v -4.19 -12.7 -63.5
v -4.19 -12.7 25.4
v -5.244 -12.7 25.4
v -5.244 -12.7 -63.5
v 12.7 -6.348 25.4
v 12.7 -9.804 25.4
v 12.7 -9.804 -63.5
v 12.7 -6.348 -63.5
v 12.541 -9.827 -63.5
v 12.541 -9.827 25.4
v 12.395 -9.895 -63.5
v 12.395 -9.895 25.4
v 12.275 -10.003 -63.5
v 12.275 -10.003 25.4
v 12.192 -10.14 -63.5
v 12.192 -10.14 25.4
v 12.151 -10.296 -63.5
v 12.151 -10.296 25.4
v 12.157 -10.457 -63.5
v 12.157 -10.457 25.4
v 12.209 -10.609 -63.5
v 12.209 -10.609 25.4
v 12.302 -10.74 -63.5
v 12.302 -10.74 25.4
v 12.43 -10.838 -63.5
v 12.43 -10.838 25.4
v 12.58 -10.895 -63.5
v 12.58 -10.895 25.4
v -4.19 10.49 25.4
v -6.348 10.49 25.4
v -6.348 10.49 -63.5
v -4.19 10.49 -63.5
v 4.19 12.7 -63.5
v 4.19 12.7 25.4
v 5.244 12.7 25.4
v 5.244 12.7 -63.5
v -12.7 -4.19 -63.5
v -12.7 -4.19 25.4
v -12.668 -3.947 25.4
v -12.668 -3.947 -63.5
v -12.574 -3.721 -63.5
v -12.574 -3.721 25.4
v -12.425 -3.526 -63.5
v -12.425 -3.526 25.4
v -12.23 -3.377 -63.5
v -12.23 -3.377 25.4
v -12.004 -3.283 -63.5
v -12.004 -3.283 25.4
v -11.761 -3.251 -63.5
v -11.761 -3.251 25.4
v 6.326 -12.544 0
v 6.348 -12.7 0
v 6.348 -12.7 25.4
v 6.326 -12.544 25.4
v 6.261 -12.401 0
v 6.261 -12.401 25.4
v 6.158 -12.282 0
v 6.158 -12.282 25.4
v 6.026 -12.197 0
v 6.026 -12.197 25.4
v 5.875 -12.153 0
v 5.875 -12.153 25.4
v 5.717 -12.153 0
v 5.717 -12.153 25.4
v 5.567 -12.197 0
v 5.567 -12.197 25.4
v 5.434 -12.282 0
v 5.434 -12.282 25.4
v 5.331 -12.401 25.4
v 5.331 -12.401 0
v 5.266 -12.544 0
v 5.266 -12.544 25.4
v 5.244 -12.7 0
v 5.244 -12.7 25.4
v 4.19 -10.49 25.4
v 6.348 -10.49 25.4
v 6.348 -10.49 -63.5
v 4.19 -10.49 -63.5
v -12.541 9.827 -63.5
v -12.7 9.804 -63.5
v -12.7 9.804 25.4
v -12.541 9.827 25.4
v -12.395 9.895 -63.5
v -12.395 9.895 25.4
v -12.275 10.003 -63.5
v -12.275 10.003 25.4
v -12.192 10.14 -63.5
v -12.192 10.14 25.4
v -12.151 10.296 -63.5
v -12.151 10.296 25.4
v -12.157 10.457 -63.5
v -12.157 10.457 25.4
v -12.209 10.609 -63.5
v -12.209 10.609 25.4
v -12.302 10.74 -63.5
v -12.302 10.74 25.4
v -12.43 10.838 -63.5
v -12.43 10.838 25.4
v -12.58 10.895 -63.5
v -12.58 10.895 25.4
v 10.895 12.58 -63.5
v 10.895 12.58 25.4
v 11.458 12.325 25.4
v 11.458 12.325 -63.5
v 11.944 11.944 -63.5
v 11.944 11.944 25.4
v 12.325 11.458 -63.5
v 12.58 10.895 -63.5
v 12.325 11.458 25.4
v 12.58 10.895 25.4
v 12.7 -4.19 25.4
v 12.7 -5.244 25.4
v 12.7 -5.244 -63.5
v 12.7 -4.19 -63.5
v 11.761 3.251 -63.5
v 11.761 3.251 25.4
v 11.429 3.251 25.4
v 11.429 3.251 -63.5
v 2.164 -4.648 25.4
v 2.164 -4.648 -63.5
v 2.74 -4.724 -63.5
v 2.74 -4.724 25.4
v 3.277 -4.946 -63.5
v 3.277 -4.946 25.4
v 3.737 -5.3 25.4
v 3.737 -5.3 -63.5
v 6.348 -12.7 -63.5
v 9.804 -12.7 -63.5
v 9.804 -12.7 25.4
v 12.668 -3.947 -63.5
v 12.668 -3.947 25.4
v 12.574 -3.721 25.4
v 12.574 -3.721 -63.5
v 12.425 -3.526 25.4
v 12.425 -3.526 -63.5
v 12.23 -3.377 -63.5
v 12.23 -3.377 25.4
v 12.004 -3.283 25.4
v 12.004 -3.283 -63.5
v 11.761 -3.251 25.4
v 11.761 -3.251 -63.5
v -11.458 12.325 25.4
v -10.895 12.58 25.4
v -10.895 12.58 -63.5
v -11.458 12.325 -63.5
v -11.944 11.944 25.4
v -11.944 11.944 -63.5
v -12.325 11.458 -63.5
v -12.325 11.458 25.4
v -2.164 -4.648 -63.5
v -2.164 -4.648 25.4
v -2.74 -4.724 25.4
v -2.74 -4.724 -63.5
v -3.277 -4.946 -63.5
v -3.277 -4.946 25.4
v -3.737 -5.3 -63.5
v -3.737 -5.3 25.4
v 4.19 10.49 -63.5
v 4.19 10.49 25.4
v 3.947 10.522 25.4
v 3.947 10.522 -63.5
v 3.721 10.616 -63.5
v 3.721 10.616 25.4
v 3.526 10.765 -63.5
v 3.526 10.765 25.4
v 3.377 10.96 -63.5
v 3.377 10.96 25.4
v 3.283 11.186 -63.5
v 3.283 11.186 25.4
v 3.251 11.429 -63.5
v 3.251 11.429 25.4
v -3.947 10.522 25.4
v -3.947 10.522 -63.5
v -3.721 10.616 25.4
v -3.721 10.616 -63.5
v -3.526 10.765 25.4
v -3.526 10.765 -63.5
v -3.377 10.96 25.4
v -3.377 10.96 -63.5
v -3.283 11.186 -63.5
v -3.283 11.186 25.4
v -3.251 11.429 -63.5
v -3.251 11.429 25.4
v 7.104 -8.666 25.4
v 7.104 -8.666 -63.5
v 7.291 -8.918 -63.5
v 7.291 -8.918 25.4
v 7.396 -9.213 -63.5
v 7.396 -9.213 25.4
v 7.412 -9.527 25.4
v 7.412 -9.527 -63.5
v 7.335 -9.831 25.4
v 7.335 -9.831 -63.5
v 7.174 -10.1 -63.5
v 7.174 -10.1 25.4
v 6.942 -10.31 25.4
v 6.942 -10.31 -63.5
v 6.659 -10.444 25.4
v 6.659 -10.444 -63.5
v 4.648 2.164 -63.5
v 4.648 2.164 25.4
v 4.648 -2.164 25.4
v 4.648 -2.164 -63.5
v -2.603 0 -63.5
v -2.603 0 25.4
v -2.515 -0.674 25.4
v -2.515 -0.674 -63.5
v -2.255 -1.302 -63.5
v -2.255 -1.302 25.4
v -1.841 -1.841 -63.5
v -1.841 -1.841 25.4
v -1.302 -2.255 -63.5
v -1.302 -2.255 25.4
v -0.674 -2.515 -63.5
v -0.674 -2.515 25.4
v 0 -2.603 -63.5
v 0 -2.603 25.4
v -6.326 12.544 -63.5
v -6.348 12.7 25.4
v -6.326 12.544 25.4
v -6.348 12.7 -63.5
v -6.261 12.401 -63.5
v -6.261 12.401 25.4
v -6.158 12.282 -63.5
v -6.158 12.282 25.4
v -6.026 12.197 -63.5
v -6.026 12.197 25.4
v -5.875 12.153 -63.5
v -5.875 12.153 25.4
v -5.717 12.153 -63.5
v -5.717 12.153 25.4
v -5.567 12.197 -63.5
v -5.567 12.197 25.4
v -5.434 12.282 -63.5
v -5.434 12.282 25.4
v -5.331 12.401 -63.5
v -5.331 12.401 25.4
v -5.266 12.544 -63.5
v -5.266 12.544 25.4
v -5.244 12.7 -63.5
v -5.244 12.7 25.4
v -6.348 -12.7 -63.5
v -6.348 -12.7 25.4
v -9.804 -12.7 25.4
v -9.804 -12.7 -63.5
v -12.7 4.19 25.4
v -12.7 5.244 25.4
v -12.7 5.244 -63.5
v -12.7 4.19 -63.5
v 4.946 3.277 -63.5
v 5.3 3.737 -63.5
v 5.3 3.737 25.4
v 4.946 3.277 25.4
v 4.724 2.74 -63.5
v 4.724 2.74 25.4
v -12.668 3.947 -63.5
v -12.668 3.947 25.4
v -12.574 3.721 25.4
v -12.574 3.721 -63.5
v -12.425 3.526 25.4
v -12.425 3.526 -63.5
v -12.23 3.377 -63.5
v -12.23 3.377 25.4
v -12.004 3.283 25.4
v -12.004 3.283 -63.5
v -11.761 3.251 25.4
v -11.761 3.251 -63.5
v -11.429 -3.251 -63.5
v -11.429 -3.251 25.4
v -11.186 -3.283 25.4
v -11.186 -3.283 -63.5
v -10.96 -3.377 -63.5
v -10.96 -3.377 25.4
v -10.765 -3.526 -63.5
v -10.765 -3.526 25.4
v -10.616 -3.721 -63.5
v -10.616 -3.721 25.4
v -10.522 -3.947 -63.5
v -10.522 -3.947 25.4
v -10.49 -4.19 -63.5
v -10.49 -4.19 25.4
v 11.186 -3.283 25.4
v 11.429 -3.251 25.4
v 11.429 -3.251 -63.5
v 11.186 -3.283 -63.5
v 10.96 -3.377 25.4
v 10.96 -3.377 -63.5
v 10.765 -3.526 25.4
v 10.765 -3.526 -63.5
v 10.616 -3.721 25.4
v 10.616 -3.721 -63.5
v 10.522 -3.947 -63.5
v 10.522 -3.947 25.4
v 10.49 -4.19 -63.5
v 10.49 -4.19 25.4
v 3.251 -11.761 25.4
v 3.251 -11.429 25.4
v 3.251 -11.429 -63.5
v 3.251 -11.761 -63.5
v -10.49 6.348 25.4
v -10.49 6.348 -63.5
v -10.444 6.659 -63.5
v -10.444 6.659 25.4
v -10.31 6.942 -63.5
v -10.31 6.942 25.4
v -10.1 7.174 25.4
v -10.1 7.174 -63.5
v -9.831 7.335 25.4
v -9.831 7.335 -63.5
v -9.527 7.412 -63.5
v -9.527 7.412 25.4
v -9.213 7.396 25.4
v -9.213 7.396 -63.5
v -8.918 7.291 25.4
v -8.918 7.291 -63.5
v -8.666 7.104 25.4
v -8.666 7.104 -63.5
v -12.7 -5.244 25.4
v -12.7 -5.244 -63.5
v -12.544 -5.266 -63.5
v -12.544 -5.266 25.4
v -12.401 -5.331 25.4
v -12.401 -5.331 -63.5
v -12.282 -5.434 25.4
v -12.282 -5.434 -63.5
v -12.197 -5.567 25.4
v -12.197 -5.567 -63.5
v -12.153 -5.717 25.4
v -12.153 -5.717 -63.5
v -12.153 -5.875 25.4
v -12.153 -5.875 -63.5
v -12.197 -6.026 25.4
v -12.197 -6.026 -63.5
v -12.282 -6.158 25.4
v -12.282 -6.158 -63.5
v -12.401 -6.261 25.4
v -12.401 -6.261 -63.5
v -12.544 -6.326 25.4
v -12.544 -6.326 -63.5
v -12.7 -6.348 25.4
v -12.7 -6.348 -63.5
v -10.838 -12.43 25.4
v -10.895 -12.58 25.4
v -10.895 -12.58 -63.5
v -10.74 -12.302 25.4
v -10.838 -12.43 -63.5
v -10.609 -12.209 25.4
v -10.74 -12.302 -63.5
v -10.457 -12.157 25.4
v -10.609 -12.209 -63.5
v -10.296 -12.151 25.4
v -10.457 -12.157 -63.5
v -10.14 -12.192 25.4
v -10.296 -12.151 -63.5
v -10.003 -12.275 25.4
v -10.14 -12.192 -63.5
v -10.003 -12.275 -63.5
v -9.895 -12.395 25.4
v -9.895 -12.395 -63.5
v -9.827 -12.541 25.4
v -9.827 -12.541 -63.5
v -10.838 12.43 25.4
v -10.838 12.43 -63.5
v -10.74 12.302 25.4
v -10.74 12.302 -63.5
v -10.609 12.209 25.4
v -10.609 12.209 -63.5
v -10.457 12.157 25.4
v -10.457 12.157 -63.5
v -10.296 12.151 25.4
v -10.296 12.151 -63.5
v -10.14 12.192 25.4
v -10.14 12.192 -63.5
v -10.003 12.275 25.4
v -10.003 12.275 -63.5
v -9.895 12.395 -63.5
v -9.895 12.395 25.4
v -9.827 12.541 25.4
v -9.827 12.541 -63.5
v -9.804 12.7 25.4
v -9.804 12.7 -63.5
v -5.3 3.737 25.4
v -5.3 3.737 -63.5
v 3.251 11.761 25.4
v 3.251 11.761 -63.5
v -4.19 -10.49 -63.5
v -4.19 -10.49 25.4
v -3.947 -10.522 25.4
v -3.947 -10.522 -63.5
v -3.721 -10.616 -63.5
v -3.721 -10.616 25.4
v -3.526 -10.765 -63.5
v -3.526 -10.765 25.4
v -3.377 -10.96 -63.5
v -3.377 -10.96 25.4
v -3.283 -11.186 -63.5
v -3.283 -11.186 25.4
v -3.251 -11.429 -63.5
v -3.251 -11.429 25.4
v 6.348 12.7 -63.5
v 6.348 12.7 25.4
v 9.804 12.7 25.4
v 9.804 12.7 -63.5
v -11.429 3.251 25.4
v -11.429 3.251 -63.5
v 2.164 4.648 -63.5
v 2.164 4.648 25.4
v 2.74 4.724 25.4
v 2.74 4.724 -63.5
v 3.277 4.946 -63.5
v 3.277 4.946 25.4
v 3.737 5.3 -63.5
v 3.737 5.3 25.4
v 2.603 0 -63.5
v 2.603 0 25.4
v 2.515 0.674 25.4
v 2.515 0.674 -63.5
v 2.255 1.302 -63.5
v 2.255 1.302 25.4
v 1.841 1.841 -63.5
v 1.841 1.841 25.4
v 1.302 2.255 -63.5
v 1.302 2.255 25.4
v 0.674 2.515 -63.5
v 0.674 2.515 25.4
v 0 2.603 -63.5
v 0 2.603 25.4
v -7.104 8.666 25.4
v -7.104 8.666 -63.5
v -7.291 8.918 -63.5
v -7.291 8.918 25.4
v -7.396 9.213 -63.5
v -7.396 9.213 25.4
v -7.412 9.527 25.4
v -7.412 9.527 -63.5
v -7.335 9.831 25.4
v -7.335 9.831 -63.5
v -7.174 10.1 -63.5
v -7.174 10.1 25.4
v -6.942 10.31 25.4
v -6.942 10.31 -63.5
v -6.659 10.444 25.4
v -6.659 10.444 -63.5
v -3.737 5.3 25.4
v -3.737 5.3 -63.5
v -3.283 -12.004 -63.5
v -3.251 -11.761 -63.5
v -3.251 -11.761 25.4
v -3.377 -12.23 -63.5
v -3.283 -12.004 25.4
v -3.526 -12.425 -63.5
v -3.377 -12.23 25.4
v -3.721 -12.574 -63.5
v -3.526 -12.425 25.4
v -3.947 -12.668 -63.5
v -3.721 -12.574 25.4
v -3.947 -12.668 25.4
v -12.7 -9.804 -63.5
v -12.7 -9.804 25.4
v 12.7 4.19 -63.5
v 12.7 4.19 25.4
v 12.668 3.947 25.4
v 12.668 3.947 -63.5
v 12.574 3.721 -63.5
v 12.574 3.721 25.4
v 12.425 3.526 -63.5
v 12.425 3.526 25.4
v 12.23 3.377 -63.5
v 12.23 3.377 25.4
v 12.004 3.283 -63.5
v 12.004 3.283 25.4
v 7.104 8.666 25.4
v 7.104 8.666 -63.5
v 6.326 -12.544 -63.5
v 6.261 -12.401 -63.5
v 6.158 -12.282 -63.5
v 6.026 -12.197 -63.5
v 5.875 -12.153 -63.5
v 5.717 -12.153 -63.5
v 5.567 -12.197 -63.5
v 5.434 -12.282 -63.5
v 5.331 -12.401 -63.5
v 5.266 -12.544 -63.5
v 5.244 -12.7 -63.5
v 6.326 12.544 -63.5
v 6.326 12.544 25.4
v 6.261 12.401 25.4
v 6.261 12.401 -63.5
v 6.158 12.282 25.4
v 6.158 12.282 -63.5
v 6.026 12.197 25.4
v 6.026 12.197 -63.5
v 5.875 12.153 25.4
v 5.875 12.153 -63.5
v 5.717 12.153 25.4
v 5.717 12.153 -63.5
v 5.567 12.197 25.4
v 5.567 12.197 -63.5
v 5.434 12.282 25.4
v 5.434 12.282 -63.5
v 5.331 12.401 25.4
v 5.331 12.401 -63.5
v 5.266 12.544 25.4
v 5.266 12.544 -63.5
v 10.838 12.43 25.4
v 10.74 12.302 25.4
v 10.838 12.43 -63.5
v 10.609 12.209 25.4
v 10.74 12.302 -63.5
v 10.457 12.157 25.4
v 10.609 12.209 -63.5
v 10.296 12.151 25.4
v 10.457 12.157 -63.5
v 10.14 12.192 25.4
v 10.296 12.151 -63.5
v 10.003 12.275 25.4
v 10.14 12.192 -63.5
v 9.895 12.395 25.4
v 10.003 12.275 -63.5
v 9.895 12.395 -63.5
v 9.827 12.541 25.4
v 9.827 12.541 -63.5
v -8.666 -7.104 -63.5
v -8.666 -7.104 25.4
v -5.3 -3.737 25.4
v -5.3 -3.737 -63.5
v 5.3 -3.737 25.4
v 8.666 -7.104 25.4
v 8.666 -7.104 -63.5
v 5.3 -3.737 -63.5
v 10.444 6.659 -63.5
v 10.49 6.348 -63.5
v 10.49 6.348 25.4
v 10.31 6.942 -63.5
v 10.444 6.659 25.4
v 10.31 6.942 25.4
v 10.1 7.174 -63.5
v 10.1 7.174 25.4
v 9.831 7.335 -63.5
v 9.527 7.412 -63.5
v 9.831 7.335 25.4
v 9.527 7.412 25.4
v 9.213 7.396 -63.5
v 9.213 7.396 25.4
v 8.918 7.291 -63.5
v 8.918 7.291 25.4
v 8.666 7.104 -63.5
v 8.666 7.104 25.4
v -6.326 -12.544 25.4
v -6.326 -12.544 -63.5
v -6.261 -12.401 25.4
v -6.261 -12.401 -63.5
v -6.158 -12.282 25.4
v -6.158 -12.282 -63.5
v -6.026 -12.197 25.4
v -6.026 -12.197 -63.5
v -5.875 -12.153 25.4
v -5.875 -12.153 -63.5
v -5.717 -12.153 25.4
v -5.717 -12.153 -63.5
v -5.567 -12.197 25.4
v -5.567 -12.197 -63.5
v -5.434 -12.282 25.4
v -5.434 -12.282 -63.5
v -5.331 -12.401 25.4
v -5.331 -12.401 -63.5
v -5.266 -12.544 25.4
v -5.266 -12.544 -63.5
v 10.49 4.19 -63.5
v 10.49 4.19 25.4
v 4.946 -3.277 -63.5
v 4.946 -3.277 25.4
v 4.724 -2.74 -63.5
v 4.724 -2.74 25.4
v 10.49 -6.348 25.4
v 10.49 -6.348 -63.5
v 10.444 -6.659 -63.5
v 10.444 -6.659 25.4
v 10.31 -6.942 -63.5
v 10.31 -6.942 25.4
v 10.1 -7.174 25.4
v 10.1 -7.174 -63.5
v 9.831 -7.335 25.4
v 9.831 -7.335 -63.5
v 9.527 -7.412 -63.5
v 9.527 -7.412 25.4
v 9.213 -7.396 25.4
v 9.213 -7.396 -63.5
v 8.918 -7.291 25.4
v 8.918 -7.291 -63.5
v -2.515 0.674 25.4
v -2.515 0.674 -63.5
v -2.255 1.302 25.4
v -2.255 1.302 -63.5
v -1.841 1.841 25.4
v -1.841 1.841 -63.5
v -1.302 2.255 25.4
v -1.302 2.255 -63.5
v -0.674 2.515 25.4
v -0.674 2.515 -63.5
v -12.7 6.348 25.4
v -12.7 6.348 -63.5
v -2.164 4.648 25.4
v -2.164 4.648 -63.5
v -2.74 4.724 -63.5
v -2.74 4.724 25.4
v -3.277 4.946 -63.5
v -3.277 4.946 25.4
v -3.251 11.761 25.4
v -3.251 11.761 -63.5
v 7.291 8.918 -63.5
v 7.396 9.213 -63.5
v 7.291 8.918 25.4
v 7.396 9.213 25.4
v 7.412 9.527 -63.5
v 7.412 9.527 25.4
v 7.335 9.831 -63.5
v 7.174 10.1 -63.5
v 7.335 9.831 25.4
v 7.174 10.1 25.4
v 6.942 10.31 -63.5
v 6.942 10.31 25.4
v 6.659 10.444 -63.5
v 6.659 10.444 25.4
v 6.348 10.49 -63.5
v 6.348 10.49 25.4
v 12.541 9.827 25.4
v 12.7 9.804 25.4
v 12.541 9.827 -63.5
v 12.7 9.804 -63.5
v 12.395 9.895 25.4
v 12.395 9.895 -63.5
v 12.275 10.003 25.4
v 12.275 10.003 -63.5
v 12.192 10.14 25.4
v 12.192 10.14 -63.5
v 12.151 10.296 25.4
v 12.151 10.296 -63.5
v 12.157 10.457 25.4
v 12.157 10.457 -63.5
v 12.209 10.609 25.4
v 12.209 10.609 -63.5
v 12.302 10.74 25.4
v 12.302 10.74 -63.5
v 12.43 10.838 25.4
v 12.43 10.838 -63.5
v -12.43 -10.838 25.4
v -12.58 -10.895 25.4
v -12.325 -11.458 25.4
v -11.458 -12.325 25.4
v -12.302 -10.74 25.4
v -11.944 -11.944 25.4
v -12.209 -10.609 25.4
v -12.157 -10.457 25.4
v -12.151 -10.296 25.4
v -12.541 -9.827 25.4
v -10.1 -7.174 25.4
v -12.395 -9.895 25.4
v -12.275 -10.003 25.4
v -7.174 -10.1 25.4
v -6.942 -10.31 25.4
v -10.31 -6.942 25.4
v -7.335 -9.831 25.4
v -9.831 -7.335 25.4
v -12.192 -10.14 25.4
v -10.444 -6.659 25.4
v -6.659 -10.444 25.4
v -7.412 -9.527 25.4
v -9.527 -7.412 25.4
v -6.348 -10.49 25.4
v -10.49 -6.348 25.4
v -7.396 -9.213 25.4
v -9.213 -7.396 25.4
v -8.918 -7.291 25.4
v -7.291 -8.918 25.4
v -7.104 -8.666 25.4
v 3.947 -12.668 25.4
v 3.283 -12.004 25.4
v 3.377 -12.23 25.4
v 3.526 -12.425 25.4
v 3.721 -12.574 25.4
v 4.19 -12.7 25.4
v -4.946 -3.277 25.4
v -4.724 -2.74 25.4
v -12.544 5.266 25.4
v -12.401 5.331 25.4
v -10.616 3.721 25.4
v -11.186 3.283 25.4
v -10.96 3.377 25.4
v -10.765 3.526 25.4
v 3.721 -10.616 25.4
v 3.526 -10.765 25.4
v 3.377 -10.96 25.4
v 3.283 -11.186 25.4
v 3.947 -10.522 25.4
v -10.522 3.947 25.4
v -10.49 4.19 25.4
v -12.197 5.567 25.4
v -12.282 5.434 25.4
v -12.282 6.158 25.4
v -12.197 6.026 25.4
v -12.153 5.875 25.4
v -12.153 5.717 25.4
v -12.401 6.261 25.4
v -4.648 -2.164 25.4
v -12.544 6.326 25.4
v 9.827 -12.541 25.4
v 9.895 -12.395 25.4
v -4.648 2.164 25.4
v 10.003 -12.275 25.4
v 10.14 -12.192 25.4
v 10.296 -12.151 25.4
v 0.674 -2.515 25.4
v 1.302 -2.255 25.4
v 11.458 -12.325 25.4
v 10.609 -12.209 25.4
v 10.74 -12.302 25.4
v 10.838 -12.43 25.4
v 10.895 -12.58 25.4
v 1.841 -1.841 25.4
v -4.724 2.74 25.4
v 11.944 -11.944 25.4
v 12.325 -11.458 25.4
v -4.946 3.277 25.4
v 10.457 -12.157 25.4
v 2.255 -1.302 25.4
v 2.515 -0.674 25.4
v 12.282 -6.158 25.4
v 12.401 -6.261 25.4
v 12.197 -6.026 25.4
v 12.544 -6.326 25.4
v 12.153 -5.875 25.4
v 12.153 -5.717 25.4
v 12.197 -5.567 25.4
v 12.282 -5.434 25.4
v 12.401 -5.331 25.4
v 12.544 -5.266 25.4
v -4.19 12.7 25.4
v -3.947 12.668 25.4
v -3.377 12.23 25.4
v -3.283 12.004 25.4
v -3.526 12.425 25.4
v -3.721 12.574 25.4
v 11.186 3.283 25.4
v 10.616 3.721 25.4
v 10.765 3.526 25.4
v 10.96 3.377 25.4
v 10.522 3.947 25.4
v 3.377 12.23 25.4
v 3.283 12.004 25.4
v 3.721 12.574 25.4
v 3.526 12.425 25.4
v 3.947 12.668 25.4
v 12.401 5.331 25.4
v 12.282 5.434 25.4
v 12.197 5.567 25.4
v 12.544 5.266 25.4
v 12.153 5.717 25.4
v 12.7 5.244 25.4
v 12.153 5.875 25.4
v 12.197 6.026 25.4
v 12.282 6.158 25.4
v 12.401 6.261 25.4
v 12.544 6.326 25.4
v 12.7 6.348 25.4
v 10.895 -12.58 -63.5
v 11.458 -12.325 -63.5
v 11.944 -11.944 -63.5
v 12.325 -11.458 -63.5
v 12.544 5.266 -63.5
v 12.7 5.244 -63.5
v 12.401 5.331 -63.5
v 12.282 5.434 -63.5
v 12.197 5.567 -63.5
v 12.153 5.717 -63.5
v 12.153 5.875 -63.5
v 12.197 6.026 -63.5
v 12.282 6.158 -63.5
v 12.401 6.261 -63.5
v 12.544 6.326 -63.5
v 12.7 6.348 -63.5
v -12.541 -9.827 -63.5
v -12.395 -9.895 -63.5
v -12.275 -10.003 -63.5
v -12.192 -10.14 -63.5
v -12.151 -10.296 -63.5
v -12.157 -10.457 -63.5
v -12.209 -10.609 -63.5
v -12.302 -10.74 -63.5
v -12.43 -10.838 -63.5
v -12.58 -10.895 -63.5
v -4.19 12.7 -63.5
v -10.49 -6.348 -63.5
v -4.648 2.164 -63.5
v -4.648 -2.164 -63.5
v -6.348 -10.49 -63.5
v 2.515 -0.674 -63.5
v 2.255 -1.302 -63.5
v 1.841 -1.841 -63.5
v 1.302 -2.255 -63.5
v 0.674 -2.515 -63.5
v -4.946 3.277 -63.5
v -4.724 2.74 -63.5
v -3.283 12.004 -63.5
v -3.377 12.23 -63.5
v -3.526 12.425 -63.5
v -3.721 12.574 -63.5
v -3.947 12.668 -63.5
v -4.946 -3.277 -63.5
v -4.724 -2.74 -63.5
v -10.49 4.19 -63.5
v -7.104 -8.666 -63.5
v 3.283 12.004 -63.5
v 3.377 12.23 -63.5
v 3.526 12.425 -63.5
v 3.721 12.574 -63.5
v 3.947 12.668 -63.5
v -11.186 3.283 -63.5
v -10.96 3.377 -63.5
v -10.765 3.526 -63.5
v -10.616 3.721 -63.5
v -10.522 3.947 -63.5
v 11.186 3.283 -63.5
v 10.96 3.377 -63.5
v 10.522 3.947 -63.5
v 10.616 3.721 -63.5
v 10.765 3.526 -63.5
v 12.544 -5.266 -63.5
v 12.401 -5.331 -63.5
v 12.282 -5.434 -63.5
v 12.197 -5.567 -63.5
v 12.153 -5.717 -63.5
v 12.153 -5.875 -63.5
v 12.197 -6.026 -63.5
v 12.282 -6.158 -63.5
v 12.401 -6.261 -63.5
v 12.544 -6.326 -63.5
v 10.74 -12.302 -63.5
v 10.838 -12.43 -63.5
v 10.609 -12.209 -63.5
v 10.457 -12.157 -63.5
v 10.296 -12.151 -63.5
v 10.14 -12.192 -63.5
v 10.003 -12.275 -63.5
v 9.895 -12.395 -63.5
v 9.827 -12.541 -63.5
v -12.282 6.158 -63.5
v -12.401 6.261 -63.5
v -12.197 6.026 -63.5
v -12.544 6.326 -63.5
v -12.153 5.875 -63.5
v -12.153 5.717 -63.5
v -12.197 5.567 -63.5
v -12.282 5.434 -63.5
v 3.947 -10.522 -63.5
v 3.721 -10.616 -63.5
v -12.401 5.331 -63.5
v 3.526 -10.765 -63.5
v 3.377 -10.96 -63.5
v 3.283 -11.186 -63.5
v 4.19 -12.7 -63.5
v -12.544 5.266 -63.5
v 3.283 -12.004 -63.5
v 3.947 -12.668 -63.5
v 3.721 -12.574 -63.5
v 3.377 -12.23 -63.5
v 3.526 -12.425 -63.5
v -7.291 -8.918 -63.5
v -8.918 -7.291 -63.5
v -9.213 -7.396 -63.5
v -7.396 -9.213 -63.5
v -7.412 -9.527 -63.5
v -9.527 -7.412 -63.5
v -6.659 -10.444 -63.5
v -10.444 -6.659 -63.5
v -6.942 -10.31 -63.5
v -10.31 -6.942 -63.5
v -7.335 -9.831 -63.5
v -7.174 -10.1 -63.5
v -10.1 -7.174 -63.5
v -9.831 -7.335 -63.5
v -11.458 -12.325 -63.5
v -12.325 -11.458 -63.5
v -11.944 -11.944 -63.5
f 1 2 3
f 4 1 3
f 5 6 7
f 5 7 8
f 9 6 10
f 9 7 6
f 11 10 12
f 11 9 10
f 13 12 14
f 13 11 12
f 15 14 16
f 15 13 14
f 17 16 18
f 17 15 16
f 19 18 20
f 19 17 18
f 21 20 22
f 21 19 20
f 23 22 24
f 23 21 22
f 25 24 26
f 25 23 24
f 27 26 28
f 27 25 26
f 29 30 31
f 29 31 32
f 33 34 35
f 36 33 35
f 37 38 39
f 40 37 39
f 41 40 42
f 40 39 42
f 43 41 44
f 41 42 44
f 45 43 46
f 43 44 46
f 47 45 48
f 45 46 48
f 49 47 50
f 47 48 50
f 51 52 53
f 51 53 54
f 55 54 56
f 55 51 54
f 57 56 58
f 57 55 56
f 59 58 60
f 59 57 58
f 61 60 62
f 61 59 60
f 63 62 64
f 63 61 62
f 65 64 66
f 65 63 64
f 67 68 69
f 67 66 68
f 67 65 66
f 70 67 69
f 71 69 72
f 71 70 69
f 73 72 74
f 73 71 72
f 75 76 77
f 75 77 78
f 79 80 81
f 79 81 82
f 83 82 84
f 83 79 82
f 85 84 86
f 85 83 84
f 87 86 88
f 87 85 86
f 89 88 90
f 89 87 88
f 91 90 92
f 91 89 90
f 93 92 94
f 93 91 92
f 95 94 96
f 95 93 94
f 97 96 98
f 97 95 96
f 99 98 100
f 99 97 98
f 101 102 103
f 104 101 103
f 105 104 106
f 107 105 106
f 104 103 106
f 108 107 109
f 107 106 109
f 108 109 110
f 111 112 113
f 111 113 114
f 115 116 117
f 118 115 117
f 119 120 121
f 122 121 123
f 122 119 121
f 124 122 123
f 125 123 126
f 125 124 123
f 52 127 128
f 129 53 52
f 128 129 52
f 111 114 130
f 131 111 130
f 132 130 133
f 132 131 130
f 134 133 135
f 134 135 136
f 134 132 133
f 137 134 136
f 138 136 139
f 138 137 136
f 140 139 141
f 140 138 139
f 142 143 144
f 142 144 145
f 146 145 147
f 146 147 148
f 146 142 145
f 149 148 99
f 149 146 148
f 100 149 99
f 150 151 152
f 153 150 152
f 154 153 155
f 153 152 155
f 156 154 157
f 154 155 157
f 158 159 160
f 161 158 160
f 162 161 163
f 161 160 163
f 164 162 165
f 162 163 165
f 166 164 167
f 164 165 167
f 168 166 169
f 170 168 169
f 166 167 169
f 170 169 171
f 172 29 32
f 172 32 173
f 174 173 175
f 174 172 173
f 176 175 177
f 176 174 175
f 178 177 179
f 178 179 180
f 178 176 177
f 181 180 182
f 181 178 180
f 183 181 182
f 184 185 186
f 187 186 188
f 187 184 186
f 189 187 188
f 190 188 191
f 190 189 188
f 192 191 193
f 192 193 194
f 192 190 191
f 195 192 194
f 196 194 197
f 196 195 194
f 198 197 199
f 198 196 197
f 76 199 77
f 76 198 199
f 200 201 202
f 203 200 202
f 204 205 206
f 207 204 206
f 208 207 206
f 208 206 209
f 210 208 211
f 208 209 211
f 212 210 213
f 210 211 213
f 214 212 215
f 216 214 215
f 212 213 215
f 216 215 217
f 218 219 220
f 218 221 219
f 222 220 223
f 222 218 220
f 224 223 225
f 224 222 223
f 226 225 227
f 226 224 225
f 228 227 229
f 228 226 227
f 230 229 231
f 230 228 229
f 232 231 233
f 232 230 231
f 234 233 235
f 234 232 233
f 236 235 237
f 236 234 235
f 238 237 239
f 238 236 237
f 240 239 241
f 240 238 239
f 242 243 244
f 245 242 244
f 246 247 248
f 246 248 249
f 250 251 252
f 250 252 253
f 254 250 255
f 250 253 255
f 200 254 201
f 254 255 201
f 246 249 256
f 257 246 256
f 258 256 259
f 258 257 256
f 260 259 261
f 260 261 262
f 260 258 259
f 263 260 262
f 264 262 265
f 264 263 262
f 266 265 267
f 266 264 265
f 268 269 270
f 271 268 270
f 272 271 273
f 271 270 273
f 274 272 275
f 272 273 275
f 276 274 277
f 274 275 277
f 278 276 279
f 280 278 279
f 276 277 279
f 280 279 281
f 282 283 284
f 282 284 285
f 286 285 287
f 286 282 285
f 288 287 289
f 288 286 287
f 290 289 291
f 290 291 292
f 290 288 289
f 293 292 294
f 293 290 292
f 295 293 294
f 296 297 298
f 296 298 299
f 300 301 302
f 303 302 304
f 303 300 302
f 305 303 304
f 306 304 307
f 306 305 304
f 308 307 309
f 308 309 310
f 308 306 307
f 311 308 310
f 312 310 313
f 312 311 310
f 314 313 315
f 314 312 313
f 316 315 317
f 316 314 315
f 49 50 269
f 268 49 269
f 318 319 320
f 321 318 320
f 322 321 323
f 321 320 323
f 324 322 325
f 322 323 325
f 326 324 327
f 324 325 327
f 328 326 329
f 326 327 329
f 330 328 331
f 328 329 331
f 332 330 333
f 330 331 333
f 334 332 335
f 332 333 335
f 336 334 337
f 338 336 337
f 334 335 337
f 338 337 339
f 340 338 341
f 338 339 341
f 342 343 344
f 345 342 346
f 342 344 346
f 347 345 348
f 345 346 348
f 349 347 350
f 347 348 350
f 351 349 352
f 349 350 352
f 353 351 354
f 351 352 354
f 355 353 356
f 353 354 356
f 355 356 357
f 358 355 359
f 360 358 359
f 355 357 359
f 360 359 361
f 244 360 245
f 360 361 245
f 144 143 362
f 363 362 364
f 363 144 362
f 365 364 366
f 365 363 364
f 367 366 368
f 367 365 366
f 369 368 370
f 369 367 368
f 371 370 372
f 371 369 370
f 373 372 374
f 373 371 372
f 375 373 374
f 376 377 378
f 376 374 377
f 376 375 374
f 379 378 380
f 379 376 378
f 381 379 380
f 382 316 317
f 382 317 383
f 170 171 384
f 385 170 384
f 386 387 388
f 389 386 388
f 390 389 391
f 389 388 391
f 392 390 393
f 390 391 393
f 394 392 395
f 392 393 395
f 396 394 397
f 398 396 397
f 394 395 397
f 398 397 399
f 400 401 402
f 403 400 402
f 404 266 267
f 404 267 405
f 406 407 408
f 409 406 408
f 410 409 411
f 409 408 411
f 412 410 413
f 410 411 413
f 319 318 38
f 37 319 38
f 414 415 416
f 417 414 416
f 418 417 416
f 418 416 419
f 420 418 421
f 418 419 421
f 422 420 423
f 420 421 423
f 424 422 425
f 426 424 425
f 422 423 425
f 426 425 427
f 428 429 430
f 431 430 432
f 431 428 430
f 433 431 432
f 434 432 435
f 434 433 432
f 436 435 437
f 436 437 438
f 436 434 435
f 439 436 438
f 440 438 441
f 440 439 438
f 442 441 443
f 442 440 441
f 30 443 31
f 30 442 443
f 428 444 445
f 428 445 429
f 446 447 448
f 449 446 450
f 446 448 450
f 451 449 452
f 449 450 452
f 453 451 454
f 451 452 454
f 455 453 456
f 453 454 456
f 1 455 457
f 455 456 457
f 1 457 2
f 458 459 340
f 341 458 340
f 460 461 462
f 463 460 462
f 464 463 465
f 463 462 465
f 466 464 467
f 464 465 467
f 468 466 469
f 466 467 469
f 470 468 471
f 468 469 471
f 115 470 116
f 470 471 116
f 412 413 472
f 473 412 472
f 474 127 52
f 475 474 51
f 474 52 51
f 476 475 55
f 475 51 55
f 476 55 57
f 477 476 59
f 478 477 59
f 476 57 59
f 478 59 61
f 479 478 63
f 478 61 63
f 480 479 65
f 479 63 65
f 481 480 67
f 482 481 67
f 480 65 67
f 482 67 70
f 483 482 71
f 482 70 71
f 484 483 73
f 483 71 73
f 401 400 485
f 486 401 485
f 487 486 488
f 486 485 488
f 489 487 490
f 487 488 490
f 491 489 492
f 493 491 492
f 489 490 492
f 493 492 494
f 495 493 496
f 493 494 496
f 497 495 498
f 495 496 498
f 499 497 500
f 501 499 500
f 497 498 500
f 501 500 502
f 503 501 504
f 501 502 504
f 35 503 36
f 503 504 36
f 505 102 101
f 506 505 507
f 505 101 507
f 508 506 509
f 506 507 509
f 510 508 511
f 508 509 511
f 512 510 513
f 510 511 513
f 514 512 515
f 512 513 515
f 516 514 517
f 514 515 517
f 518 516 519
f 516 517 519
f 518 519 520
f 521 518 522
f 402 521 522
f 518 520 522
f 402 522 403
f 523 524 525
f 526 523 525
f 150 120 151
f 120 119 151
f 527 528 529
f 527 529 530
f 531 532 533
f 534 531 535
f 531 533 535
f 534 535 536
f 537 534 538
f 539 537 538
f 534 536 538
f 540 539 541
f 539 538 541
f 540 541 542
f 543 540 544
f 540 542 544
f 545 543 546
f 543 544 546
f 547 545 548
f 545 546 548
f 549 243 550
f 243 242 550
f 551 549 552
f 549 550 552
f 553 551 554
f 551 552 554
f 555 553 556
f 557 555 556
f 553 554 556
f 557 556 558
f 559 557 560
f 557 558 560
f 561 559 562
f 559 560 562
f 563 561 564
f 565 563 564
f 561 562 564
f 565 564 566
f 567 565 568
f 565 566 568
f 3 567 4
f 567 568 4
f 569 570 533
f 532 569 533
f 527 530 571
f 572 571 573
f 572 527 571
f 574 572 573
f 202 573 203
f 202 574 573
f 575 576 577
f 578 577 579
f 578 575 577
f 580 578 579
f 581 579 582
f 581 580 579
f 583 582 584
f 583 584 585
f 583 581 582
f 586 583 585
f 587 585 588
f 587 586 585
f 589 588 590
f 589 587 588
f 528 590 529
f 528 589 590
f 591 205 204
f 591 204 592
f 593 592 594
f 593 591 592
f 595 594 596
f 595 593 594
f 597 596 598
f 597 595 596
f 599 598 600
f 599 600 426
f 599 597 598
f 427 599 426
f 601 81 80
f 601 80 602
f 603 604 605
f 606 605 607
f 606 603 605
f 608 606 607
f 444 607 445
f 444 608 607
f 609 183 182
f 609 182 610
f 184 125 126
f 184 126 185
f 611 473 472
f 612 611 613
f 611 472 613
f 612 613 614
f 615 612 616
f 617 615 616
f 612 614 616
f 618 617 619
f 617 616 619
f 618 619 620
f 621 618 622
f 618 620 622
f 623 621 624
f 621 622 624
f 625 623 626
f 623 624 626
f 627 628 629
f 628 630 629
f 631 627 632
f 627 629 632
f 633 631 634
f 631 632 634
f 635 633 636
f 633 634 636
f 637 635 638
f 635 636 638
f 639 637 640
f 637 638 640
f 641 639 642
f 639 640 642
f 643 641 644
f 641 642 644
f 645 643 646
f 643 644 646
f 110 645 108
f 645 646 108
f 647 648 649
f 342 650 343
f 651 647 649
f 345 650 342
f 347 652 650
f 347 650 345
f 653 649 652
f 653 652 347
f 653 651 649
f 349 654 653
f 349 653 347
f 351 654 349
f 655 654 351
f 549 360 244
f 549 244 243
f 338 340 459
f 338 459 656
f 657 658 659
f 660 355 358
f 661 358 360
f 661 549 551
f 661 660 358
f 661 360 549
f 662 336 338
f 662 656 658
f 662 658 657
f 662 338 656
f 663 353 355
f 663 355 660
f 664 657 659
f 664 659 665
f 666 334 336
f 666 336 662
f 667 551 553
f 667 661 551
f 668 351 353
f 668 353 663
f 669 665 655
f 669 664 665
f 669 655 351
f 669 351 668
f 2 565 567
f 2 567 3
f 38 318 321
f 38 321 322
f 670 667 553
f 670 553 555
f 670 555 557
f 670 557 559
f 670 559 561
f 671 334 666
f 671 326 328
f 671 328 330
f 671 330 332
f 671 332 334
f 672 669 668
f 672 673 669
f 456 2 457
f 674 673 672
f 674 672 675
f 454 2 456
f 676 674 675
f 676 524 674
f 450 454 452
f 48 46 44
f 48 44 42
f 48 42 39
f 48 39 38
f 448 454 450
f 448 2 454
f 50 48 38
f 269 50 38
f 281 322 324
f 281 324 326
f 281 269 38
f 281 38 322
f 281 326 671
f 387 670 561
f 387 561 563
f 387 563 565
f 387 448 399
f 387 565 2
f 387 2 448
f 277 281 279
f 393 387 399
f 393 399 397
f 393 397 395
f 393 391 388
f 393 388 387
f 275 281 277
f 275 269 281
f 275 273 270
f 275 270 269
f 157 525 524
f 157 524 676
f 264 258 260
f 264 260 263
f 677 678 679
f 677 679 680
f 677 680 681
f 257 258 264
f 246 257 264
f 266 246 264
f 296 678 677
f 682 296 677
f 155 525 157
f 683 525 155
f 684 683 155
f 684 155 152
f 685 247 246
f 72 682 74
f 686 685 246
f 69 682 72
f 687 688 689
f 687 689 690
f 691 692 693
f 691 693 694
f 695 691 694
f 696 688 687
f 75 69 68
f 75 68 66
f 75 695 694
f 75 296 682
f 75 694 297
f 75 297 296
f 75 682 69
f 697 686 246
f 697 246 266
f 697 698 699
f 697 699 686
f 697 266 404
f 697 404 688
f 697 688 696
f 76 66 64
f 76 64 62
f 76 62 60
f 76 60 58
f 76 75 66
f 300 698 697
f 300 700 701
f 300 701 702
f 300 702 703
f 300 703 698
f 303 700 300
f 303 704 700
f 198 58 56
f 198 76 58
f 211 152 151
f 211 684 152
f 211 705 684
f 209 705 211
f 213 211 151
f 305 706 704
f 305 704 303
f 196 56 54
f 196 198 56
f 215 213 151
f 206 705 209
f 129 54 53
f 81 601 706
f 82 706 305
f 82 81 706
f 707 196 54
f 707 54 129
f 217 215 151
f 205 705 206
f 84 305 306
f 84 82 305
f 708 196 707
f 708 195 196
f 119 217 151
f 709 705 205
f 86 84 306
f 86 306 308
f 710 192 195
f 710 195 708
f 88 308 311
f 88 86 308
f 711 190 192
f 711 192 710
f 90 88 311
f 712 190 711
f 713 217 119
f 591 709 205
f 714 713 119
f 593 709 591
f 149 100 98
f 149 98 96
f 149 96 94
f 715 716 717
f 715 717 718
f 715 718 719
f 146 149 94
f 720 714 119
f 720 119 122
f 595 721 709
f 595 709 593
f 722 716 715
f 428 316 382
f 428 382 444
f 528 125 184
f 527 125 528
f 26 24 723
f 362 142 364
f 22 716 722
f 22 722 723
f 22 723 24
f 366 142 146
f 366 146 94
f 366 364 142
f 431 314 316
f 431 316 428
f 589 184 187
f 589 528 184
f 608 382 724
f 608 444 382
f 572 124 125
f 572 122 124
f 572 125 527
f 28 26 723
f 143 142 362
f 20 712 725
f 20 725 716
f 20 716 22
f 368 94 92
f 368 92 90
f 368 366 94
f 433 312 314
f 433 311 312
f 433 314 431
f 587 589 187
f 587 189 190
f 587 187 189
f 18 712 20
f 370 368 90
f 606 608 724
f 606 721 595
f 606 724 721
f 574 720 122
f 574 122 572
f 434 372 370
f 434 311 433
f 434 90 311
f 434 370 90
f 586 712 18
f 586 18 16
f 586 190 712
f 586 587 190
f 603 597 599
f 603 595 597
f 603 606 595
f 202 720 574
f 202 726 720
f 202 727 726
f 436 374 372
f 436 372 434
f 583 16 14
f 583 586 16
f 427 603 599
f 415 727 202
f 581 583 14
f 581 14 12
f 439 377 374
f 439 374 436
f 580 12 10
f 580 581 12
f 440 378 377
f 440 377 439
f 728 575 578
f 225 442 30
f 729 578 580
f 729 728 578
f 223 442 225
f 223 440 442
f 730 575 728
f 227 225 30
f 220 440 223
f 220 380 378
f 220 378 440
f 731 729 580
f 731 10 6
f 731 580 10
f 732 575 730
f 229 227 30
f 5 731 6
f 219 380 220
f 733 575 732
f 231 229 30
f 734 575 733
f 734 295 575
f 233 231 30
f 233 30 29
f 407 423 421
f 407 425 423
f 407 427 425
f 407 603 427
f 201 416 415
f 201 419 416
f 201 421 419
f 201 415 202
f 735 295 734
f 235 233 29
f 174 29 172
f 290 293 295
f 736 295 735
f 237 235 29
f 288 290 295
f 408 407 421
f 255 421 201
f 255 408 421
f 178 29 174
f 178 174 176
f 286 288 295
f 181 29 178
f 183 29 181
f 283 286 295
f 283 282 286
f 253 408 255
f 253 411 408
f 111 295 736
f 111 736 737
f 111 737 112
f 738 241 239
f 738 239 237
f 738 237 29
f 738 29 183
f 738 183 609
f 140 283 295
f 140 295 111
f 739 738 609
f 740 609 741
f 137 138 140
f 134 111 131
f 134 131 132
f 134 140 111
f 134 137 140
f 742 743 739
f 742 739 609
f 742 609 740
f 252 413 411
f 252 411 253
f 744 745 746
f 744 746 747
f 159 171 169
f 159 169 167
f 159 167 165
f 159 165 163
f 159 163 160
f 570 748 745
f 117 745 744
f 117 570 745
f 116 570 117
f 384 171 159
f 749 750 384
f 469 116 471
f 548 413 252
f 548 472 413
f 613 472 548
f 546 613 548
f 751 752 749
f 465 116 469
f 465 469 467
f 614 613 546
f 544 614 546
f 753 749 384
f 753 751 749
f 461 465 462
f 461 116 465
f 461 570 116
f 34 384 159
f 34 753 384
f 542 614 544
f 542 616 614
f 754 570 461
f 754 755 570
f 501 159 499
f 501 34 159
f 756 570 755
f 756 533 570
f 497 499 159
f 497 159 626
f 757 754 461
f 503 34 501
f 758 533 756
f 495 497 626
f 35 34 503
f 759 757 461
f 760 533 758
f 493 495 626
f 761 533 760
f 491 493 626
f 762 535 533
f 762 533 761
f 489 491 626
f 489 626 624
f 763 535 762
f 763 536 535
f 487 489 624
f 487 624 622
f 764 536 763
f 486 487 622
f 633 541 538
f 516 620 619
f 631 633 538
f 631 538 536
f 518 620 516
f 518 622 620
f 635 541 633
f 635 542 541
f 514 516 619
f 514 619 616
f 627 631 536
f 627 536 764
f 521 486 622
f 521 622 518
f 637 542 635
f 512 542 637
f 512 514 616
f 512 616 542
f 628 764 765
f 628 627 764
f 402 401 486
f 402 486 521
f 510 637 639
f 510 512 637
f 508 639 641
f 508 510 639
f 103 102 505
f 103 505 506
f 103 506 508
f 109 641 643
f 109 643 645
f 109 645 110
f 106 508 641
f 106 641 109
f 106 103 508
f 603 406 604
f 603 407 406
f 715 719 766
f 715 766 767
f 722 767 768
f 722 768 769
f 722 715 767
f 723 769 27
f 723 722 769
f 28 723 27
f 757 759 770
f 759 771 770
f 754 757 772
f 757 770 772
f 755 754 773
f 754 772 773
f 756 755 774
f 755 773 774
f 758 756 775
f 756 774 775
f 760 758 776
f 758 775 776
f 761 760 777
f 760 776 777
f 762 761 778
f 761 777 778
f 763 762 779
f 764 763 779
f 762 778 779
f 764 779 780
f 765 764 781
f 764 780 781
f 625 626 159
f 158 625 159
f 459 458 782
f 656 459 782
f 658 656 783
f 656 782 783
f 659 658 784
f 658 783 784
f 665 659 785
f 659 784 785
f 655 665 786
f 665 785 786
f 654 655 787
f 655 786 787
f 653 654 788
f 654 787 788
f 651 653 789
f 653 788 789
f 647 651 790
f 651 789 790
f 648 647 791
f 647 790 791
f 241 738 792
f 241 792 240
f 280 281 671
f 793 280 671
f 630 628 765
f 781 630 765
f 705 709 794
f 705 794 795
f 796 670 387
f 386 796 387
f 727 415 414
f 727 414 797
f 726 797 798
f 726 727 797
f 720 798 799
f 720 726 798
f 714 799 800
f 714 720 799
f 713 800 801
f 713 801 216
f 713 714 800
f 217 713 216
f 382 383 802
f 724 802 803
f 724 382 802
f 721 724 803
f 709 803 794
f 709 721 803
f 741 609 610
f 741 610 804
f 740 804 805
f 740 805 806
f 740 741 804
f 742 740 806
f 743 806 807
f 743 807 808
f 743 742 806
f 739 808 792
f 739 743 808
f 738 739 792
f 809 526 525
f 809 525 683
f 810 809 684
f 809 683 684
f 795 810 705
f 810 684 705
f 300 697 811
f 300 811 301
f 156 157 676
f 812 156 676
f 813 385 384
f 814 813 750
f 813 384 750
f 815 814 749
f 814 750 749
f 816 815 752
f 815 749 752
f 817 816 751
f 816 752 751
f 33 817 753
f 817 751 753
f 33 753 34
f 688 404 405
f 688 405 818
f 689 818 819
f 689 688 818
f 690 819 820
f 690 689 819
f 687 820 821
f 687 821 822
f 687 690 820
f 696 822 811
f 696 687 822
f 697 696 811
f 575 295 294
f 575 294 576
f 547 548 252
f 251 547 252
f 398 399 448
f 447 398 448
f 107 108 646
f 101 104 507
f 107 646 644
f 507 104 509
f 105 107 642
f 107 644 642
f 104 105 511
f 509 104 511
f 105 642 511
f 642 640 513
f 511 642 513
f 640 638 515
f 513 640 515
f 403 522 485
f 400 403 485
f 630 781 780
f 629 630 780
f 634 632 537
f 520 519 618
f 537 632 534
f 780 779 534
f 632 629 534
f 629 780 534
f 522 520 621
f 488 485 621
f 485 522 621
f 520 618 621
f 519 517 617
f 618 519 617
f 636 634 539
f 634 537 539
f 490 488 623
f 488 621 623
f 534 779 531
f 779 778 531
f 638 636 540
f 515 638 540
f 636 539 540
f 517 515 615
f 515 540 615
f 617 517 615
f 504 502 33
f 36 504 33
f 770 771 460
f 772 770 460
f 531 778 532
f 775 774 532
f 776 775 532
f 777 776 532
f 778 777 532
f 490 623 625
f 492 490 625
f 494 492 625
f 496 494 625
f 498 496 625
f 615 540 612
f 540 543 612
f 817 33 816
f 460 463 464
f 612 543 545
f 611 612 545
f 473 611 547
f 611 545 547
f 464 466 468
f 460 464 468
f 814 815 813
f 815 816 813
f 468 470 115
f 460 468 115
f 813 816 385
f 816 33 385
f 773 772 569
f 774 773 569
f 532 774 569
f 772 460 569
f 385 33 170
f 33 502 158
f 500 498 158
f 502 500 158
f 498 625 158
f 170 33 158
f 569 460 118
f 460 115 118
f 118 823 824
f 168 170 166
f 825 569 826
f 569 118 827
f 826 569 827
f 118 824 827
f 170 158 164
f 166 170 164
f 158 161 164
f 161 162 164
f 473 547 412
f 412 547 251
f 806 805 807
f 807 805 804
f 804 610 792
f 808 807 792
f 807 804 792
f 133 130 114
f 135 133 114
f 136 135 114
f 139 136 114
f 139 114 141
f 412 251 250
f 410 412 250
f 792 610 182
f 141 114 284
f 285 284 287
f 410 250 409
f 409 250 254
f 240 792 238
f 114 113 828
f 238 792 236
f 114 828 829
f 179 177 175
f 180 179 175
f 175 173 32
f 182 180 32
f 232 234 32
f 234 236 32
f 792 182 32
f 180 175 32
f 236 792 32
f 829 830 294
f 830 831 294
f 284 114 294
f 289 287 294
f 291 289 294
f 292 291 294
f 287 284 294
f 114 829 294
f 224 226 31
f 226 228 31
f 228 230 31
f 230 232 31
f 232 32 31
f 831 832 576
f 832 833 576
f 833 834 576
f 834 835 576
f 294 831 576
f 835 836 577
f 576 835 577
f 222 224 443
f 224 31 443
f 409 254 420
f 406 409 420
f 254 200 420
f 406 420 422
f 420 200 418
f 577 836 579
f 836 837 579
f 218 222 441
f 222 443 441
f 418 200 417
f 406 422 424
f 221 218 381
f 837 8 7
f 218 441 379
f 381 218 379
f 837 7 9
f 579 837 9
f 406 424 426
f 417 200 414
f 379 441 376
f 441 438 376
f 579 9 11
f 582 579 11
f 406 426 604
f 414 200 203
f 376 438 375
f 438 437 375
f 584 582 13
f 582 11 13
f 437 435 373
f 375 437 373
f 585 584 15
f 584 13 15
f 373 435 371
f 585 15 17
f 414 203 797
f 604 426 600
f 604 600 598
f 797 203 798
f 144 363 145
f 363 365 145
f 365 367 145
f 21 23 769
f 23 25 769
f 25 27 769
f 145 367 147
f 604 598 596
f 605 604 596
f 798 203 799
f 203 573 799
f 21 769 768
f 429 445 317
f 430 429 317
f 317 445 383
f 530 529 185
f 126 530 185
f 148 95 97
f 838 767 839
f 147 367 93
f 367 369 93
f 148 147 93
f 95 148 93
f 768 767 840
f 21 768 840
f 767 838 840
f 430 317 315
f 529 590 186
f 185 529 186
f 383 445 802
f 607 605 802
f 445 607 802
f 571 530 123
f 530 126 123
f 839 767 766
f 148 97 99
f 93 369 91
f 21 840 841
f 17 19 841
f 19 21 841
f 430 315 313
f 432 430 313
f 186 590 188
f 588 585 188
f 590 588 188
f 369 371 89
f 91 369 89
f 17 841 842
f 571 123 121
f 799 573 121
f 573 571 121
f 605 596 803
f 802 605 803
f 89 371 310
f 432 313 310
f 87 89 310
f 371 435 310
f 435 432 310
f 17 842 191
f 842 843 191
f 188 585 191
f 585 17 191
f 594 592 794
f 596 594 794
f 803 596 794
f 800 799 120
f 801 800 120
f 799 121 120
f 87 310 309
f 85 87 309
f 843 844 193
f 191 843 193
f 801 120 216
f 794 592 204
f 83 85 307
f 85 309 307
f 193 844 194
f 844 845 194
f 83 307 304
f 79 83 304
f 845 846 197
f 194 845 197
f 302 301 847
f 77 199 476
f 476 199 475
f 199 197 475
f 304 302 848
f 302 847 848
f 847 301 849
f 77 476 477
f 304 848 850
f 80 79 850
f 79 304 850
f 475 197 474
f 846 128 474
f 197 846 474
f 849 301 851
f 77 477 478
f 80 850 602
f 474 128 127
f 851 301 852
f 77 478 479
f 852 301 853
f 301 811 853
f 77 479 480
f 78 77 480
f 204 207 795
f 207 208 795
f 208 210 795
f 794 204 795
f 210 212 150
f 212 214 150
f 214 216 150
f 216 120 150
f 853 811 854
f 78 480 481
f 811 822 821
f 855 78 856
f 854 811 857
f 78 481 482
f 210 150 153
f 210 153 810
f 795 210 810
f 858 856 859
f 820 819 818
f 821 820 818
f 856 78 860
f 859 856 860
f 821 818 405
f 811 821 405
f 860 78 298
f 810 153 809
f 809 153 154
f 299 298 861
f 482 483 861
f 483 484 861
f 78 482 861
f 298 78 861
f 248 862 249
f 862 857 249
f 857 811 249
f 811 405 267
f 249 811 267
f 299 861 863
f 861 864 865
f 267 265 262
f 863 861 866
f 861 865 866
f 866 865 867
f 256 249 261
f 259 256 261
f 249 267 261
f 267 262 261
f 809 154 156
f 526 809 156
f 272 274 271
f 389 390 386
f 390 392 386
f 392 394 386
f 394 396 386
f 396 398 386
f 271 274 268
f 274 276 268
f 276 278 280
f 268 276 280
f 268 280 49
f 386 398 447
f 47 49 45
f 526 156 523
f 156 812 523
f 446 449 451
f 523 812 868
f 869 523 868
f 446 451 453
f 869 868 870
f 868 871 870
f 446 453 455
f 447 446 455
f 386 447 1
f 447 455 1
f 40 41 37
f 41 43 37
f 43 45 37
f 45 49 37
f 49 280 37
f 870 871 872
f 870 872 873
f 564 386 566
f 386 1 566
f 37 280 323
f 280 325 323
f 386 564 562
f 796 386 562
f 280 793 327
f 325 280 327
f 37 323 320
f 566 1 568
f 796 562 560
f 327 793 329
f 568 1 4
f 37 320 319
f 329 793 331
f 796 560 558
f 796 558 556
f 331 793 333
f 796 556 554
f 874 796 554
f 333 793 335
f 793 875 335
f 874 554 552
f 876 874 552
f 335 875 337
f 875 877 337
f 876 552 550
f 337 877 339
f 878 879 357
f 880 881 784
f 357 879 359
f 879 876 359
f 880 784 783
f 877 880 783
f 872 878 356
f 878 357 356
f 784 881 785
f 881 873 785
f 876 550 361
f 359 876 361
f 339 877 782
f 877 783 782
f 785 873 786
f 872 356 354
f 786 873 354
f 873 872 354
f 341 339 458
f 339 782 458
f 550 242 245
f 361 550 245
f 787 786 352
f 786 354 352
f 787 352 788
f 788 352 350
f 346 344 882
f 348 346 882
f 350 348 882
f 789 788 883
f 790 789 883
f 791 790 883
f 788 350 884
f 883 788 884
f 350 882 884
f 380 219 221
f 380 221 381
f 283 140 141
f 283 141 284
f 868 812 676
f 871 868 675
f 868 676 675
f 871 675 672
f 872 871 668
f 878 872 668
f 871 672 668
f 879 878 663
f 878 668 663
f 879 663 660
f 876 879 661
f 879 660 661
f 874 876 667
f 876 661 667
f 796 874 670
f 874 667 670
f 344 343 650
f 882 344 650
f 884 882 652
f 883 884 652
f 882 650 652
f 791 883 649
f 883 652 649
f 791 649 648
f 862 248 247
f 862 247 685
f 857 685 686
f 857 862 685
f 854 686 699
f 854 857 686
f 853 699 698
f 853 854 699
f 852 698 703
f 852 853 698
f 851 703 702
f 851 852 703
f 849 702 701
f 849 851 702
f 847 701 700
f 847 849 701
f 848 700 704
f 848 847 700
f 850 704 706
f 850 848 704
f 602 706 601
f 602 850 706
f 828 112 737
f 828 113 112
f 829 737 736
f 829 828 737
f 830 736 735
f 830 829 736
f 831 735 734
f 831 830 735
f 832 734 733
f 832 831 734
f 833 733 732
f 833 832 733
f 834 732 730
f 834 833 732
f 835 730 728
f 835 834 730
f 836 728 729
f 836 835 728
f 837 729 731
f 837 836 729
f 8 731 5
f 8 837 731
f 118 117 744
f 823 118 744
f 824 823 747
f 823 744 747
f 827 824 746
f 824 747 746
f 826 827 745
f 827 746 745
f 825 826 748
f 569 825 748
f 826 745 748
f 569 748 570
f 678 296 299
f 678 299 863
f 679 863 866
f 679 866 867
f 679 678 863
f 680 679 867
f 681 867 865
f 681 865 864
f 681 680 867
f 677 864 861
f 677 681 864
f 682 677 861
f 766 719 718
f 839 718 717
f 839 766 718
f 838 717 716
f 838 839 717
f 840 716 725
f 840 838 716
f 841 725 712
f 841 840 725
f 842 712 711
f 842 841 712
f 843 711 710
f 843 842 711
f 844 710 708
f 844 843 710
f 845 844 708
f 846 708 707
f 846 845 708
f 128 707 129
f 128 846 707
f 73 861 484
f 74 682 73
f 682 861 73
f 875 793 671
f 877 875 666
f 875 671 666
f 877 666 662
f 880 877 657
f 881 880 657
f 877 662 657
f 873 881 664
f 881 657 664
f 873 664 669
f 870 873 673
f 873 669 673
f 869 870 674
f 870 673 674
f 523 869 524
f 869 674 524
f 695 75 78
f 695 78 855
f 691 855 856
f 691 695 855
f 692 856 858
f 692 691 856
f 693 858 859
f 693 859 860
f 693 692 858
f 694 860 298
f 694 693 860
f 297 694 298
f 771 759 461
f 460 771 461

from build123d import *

# Parameters (mm, degrees)
BOSS_EXTRUDE1_DEPTH     = 63.5
SKETCH5_R               = 0.55245
CUT_EXTRUDE1_DEPTH      = 64.5
CUT_EXTRUDE1_DEPTH_BACK = 64.5
SKETCH7_W               = 25.4
SKETCH7_H               = 38.1
CUT_EXTRUDE2_DEPTH      = 12.7


with BuildPart() as part:
    # Sketch4 → Boss-Extrude1 (new body, symmetric)
    with BuildSketch(Plane.XY):
        with BuildLine():
            Line((4.190365, -12.7), (10.11729625, -12.7))
            ThreePointArc((10.11729625, -12.7), (11.943543585, -11.943543585), (12.7, -10.11729625))
            Line((12.7, -10.11729625), (12.7, -4.190365))
            ThreePointArc((12.7, -4.190365), (12.42492494, -3.52627506), (11.760835, -3.2512))
            Line((11.760835, -3.2512), (11.429365, -3.2512))
            ThreePointArc((11.429365, -3.2512), (10.76527506, -3.52627506), (10.4902, -4.190365))
            Line((10.4902, -4.190365), (10.4902, -6.348478019))
            ThreePointArc((10.4902, -6.348478019), (9.830707141, -7.335478831), (8.666460301, -7.103895736))
            Line((8.666460301, -7.103895736), (5.299899128, -3.737334563))
            ThreePointArc((5.299899128, -3.737334563), (4.817571085, -3.015479634), (4.6482, -2.16399369))
            Line((4.6482, -2.16399369), (4.6482, 0))
            Line((4.6482, 0), (2.6035, 0))
            ThreePointArc((2.6035, 0), (1.840952505, -1.840952505), (0, -2.6035))
            Line((0, -2.6035), (0, -4.6482))
            Line((0, -4.6482), (2.16399369, -4.6482))
            ThreePointArc((2.16399369, -4.6482), (3.015479634, -4.817571085), (3.737334563, -5.299899128))
            Line((3.737334563, -5.299899128), (7.103895736, -8.666460301))
            ThreePointArc((7.103895736, -8.666460301), (7.335478831, -9.830707141), (6.348478019, -10.4902))
            Line((6.348478019, -10.4902), (4.190365, -10.4902))
            ThreePointArc((4.190365, -10.4902), (3.52627506, -10.76527506), (3.2512, -11.429365))
            Line((3.2512, -11.429365), (3.2512, -11.760835))
            ThreePointArc((3.2512, -11.760835), (3.52627506, -12.42492494), (4.190365, -12.7))
        make_face()
    extrude(amount=BOSS_EXTRUDE1_DEPTH, both=True)

    # Sketch5 → Cut-Extrude1 (cut, two sides)
    with BuildSketch(Plane.XY) as cut_extrude1_sk:
        with Locations((10.356153152, -12.7)):
            Circle(SKETCH5_R)
        with Locations((5.796028019, -12.7)):
            Circle(SKETCH5_R)
        with Locations((12.7, -10.356153152)):
            Circle(SKETCH5_R)
        with Locations((12.7, -5.796028019)):
            Circle(SKETCH5_R)
    extrude(amount=CUT_EXTRUDE1_DEPTH, mode=Mode.SUBTRACT)
    extrude(cut_extrude1_sk.sketch, amount=-CUT_EXTRUDE1_DEPTH_BACK, mode=Mode.SUBTRACT)

    # Mirror1: part across plane


with BuildPart() as part_1:
    add(part.part)
    add(part.part.mirror(Plane(origin=(0, 0, 0), x_dir=(0, 0, 1), z_dir=(1, 0, 0))))

    # Mirror2: part across plane


with BuildPart() as part_2:
    add(part_1.part)
    add(part_1.part.mirror(Plane.ZX))

    # Sketch7 → Cut-Extrude2 (cut, symmetric)
    with BuildSketch(Plane(origin=(0, 0, 0), x_dir=(1, 0, 0), z_dir=(0, 1, 0))):
        with Locations((0, -44.45)):
            Rectangle(SKETCH7_W, SKETCH7_H)
    extrude(amount=CUT_EXTRUDE2_DEPTH, both=True, mode=Mode.SUBTRACT)


solid = part_2.part
